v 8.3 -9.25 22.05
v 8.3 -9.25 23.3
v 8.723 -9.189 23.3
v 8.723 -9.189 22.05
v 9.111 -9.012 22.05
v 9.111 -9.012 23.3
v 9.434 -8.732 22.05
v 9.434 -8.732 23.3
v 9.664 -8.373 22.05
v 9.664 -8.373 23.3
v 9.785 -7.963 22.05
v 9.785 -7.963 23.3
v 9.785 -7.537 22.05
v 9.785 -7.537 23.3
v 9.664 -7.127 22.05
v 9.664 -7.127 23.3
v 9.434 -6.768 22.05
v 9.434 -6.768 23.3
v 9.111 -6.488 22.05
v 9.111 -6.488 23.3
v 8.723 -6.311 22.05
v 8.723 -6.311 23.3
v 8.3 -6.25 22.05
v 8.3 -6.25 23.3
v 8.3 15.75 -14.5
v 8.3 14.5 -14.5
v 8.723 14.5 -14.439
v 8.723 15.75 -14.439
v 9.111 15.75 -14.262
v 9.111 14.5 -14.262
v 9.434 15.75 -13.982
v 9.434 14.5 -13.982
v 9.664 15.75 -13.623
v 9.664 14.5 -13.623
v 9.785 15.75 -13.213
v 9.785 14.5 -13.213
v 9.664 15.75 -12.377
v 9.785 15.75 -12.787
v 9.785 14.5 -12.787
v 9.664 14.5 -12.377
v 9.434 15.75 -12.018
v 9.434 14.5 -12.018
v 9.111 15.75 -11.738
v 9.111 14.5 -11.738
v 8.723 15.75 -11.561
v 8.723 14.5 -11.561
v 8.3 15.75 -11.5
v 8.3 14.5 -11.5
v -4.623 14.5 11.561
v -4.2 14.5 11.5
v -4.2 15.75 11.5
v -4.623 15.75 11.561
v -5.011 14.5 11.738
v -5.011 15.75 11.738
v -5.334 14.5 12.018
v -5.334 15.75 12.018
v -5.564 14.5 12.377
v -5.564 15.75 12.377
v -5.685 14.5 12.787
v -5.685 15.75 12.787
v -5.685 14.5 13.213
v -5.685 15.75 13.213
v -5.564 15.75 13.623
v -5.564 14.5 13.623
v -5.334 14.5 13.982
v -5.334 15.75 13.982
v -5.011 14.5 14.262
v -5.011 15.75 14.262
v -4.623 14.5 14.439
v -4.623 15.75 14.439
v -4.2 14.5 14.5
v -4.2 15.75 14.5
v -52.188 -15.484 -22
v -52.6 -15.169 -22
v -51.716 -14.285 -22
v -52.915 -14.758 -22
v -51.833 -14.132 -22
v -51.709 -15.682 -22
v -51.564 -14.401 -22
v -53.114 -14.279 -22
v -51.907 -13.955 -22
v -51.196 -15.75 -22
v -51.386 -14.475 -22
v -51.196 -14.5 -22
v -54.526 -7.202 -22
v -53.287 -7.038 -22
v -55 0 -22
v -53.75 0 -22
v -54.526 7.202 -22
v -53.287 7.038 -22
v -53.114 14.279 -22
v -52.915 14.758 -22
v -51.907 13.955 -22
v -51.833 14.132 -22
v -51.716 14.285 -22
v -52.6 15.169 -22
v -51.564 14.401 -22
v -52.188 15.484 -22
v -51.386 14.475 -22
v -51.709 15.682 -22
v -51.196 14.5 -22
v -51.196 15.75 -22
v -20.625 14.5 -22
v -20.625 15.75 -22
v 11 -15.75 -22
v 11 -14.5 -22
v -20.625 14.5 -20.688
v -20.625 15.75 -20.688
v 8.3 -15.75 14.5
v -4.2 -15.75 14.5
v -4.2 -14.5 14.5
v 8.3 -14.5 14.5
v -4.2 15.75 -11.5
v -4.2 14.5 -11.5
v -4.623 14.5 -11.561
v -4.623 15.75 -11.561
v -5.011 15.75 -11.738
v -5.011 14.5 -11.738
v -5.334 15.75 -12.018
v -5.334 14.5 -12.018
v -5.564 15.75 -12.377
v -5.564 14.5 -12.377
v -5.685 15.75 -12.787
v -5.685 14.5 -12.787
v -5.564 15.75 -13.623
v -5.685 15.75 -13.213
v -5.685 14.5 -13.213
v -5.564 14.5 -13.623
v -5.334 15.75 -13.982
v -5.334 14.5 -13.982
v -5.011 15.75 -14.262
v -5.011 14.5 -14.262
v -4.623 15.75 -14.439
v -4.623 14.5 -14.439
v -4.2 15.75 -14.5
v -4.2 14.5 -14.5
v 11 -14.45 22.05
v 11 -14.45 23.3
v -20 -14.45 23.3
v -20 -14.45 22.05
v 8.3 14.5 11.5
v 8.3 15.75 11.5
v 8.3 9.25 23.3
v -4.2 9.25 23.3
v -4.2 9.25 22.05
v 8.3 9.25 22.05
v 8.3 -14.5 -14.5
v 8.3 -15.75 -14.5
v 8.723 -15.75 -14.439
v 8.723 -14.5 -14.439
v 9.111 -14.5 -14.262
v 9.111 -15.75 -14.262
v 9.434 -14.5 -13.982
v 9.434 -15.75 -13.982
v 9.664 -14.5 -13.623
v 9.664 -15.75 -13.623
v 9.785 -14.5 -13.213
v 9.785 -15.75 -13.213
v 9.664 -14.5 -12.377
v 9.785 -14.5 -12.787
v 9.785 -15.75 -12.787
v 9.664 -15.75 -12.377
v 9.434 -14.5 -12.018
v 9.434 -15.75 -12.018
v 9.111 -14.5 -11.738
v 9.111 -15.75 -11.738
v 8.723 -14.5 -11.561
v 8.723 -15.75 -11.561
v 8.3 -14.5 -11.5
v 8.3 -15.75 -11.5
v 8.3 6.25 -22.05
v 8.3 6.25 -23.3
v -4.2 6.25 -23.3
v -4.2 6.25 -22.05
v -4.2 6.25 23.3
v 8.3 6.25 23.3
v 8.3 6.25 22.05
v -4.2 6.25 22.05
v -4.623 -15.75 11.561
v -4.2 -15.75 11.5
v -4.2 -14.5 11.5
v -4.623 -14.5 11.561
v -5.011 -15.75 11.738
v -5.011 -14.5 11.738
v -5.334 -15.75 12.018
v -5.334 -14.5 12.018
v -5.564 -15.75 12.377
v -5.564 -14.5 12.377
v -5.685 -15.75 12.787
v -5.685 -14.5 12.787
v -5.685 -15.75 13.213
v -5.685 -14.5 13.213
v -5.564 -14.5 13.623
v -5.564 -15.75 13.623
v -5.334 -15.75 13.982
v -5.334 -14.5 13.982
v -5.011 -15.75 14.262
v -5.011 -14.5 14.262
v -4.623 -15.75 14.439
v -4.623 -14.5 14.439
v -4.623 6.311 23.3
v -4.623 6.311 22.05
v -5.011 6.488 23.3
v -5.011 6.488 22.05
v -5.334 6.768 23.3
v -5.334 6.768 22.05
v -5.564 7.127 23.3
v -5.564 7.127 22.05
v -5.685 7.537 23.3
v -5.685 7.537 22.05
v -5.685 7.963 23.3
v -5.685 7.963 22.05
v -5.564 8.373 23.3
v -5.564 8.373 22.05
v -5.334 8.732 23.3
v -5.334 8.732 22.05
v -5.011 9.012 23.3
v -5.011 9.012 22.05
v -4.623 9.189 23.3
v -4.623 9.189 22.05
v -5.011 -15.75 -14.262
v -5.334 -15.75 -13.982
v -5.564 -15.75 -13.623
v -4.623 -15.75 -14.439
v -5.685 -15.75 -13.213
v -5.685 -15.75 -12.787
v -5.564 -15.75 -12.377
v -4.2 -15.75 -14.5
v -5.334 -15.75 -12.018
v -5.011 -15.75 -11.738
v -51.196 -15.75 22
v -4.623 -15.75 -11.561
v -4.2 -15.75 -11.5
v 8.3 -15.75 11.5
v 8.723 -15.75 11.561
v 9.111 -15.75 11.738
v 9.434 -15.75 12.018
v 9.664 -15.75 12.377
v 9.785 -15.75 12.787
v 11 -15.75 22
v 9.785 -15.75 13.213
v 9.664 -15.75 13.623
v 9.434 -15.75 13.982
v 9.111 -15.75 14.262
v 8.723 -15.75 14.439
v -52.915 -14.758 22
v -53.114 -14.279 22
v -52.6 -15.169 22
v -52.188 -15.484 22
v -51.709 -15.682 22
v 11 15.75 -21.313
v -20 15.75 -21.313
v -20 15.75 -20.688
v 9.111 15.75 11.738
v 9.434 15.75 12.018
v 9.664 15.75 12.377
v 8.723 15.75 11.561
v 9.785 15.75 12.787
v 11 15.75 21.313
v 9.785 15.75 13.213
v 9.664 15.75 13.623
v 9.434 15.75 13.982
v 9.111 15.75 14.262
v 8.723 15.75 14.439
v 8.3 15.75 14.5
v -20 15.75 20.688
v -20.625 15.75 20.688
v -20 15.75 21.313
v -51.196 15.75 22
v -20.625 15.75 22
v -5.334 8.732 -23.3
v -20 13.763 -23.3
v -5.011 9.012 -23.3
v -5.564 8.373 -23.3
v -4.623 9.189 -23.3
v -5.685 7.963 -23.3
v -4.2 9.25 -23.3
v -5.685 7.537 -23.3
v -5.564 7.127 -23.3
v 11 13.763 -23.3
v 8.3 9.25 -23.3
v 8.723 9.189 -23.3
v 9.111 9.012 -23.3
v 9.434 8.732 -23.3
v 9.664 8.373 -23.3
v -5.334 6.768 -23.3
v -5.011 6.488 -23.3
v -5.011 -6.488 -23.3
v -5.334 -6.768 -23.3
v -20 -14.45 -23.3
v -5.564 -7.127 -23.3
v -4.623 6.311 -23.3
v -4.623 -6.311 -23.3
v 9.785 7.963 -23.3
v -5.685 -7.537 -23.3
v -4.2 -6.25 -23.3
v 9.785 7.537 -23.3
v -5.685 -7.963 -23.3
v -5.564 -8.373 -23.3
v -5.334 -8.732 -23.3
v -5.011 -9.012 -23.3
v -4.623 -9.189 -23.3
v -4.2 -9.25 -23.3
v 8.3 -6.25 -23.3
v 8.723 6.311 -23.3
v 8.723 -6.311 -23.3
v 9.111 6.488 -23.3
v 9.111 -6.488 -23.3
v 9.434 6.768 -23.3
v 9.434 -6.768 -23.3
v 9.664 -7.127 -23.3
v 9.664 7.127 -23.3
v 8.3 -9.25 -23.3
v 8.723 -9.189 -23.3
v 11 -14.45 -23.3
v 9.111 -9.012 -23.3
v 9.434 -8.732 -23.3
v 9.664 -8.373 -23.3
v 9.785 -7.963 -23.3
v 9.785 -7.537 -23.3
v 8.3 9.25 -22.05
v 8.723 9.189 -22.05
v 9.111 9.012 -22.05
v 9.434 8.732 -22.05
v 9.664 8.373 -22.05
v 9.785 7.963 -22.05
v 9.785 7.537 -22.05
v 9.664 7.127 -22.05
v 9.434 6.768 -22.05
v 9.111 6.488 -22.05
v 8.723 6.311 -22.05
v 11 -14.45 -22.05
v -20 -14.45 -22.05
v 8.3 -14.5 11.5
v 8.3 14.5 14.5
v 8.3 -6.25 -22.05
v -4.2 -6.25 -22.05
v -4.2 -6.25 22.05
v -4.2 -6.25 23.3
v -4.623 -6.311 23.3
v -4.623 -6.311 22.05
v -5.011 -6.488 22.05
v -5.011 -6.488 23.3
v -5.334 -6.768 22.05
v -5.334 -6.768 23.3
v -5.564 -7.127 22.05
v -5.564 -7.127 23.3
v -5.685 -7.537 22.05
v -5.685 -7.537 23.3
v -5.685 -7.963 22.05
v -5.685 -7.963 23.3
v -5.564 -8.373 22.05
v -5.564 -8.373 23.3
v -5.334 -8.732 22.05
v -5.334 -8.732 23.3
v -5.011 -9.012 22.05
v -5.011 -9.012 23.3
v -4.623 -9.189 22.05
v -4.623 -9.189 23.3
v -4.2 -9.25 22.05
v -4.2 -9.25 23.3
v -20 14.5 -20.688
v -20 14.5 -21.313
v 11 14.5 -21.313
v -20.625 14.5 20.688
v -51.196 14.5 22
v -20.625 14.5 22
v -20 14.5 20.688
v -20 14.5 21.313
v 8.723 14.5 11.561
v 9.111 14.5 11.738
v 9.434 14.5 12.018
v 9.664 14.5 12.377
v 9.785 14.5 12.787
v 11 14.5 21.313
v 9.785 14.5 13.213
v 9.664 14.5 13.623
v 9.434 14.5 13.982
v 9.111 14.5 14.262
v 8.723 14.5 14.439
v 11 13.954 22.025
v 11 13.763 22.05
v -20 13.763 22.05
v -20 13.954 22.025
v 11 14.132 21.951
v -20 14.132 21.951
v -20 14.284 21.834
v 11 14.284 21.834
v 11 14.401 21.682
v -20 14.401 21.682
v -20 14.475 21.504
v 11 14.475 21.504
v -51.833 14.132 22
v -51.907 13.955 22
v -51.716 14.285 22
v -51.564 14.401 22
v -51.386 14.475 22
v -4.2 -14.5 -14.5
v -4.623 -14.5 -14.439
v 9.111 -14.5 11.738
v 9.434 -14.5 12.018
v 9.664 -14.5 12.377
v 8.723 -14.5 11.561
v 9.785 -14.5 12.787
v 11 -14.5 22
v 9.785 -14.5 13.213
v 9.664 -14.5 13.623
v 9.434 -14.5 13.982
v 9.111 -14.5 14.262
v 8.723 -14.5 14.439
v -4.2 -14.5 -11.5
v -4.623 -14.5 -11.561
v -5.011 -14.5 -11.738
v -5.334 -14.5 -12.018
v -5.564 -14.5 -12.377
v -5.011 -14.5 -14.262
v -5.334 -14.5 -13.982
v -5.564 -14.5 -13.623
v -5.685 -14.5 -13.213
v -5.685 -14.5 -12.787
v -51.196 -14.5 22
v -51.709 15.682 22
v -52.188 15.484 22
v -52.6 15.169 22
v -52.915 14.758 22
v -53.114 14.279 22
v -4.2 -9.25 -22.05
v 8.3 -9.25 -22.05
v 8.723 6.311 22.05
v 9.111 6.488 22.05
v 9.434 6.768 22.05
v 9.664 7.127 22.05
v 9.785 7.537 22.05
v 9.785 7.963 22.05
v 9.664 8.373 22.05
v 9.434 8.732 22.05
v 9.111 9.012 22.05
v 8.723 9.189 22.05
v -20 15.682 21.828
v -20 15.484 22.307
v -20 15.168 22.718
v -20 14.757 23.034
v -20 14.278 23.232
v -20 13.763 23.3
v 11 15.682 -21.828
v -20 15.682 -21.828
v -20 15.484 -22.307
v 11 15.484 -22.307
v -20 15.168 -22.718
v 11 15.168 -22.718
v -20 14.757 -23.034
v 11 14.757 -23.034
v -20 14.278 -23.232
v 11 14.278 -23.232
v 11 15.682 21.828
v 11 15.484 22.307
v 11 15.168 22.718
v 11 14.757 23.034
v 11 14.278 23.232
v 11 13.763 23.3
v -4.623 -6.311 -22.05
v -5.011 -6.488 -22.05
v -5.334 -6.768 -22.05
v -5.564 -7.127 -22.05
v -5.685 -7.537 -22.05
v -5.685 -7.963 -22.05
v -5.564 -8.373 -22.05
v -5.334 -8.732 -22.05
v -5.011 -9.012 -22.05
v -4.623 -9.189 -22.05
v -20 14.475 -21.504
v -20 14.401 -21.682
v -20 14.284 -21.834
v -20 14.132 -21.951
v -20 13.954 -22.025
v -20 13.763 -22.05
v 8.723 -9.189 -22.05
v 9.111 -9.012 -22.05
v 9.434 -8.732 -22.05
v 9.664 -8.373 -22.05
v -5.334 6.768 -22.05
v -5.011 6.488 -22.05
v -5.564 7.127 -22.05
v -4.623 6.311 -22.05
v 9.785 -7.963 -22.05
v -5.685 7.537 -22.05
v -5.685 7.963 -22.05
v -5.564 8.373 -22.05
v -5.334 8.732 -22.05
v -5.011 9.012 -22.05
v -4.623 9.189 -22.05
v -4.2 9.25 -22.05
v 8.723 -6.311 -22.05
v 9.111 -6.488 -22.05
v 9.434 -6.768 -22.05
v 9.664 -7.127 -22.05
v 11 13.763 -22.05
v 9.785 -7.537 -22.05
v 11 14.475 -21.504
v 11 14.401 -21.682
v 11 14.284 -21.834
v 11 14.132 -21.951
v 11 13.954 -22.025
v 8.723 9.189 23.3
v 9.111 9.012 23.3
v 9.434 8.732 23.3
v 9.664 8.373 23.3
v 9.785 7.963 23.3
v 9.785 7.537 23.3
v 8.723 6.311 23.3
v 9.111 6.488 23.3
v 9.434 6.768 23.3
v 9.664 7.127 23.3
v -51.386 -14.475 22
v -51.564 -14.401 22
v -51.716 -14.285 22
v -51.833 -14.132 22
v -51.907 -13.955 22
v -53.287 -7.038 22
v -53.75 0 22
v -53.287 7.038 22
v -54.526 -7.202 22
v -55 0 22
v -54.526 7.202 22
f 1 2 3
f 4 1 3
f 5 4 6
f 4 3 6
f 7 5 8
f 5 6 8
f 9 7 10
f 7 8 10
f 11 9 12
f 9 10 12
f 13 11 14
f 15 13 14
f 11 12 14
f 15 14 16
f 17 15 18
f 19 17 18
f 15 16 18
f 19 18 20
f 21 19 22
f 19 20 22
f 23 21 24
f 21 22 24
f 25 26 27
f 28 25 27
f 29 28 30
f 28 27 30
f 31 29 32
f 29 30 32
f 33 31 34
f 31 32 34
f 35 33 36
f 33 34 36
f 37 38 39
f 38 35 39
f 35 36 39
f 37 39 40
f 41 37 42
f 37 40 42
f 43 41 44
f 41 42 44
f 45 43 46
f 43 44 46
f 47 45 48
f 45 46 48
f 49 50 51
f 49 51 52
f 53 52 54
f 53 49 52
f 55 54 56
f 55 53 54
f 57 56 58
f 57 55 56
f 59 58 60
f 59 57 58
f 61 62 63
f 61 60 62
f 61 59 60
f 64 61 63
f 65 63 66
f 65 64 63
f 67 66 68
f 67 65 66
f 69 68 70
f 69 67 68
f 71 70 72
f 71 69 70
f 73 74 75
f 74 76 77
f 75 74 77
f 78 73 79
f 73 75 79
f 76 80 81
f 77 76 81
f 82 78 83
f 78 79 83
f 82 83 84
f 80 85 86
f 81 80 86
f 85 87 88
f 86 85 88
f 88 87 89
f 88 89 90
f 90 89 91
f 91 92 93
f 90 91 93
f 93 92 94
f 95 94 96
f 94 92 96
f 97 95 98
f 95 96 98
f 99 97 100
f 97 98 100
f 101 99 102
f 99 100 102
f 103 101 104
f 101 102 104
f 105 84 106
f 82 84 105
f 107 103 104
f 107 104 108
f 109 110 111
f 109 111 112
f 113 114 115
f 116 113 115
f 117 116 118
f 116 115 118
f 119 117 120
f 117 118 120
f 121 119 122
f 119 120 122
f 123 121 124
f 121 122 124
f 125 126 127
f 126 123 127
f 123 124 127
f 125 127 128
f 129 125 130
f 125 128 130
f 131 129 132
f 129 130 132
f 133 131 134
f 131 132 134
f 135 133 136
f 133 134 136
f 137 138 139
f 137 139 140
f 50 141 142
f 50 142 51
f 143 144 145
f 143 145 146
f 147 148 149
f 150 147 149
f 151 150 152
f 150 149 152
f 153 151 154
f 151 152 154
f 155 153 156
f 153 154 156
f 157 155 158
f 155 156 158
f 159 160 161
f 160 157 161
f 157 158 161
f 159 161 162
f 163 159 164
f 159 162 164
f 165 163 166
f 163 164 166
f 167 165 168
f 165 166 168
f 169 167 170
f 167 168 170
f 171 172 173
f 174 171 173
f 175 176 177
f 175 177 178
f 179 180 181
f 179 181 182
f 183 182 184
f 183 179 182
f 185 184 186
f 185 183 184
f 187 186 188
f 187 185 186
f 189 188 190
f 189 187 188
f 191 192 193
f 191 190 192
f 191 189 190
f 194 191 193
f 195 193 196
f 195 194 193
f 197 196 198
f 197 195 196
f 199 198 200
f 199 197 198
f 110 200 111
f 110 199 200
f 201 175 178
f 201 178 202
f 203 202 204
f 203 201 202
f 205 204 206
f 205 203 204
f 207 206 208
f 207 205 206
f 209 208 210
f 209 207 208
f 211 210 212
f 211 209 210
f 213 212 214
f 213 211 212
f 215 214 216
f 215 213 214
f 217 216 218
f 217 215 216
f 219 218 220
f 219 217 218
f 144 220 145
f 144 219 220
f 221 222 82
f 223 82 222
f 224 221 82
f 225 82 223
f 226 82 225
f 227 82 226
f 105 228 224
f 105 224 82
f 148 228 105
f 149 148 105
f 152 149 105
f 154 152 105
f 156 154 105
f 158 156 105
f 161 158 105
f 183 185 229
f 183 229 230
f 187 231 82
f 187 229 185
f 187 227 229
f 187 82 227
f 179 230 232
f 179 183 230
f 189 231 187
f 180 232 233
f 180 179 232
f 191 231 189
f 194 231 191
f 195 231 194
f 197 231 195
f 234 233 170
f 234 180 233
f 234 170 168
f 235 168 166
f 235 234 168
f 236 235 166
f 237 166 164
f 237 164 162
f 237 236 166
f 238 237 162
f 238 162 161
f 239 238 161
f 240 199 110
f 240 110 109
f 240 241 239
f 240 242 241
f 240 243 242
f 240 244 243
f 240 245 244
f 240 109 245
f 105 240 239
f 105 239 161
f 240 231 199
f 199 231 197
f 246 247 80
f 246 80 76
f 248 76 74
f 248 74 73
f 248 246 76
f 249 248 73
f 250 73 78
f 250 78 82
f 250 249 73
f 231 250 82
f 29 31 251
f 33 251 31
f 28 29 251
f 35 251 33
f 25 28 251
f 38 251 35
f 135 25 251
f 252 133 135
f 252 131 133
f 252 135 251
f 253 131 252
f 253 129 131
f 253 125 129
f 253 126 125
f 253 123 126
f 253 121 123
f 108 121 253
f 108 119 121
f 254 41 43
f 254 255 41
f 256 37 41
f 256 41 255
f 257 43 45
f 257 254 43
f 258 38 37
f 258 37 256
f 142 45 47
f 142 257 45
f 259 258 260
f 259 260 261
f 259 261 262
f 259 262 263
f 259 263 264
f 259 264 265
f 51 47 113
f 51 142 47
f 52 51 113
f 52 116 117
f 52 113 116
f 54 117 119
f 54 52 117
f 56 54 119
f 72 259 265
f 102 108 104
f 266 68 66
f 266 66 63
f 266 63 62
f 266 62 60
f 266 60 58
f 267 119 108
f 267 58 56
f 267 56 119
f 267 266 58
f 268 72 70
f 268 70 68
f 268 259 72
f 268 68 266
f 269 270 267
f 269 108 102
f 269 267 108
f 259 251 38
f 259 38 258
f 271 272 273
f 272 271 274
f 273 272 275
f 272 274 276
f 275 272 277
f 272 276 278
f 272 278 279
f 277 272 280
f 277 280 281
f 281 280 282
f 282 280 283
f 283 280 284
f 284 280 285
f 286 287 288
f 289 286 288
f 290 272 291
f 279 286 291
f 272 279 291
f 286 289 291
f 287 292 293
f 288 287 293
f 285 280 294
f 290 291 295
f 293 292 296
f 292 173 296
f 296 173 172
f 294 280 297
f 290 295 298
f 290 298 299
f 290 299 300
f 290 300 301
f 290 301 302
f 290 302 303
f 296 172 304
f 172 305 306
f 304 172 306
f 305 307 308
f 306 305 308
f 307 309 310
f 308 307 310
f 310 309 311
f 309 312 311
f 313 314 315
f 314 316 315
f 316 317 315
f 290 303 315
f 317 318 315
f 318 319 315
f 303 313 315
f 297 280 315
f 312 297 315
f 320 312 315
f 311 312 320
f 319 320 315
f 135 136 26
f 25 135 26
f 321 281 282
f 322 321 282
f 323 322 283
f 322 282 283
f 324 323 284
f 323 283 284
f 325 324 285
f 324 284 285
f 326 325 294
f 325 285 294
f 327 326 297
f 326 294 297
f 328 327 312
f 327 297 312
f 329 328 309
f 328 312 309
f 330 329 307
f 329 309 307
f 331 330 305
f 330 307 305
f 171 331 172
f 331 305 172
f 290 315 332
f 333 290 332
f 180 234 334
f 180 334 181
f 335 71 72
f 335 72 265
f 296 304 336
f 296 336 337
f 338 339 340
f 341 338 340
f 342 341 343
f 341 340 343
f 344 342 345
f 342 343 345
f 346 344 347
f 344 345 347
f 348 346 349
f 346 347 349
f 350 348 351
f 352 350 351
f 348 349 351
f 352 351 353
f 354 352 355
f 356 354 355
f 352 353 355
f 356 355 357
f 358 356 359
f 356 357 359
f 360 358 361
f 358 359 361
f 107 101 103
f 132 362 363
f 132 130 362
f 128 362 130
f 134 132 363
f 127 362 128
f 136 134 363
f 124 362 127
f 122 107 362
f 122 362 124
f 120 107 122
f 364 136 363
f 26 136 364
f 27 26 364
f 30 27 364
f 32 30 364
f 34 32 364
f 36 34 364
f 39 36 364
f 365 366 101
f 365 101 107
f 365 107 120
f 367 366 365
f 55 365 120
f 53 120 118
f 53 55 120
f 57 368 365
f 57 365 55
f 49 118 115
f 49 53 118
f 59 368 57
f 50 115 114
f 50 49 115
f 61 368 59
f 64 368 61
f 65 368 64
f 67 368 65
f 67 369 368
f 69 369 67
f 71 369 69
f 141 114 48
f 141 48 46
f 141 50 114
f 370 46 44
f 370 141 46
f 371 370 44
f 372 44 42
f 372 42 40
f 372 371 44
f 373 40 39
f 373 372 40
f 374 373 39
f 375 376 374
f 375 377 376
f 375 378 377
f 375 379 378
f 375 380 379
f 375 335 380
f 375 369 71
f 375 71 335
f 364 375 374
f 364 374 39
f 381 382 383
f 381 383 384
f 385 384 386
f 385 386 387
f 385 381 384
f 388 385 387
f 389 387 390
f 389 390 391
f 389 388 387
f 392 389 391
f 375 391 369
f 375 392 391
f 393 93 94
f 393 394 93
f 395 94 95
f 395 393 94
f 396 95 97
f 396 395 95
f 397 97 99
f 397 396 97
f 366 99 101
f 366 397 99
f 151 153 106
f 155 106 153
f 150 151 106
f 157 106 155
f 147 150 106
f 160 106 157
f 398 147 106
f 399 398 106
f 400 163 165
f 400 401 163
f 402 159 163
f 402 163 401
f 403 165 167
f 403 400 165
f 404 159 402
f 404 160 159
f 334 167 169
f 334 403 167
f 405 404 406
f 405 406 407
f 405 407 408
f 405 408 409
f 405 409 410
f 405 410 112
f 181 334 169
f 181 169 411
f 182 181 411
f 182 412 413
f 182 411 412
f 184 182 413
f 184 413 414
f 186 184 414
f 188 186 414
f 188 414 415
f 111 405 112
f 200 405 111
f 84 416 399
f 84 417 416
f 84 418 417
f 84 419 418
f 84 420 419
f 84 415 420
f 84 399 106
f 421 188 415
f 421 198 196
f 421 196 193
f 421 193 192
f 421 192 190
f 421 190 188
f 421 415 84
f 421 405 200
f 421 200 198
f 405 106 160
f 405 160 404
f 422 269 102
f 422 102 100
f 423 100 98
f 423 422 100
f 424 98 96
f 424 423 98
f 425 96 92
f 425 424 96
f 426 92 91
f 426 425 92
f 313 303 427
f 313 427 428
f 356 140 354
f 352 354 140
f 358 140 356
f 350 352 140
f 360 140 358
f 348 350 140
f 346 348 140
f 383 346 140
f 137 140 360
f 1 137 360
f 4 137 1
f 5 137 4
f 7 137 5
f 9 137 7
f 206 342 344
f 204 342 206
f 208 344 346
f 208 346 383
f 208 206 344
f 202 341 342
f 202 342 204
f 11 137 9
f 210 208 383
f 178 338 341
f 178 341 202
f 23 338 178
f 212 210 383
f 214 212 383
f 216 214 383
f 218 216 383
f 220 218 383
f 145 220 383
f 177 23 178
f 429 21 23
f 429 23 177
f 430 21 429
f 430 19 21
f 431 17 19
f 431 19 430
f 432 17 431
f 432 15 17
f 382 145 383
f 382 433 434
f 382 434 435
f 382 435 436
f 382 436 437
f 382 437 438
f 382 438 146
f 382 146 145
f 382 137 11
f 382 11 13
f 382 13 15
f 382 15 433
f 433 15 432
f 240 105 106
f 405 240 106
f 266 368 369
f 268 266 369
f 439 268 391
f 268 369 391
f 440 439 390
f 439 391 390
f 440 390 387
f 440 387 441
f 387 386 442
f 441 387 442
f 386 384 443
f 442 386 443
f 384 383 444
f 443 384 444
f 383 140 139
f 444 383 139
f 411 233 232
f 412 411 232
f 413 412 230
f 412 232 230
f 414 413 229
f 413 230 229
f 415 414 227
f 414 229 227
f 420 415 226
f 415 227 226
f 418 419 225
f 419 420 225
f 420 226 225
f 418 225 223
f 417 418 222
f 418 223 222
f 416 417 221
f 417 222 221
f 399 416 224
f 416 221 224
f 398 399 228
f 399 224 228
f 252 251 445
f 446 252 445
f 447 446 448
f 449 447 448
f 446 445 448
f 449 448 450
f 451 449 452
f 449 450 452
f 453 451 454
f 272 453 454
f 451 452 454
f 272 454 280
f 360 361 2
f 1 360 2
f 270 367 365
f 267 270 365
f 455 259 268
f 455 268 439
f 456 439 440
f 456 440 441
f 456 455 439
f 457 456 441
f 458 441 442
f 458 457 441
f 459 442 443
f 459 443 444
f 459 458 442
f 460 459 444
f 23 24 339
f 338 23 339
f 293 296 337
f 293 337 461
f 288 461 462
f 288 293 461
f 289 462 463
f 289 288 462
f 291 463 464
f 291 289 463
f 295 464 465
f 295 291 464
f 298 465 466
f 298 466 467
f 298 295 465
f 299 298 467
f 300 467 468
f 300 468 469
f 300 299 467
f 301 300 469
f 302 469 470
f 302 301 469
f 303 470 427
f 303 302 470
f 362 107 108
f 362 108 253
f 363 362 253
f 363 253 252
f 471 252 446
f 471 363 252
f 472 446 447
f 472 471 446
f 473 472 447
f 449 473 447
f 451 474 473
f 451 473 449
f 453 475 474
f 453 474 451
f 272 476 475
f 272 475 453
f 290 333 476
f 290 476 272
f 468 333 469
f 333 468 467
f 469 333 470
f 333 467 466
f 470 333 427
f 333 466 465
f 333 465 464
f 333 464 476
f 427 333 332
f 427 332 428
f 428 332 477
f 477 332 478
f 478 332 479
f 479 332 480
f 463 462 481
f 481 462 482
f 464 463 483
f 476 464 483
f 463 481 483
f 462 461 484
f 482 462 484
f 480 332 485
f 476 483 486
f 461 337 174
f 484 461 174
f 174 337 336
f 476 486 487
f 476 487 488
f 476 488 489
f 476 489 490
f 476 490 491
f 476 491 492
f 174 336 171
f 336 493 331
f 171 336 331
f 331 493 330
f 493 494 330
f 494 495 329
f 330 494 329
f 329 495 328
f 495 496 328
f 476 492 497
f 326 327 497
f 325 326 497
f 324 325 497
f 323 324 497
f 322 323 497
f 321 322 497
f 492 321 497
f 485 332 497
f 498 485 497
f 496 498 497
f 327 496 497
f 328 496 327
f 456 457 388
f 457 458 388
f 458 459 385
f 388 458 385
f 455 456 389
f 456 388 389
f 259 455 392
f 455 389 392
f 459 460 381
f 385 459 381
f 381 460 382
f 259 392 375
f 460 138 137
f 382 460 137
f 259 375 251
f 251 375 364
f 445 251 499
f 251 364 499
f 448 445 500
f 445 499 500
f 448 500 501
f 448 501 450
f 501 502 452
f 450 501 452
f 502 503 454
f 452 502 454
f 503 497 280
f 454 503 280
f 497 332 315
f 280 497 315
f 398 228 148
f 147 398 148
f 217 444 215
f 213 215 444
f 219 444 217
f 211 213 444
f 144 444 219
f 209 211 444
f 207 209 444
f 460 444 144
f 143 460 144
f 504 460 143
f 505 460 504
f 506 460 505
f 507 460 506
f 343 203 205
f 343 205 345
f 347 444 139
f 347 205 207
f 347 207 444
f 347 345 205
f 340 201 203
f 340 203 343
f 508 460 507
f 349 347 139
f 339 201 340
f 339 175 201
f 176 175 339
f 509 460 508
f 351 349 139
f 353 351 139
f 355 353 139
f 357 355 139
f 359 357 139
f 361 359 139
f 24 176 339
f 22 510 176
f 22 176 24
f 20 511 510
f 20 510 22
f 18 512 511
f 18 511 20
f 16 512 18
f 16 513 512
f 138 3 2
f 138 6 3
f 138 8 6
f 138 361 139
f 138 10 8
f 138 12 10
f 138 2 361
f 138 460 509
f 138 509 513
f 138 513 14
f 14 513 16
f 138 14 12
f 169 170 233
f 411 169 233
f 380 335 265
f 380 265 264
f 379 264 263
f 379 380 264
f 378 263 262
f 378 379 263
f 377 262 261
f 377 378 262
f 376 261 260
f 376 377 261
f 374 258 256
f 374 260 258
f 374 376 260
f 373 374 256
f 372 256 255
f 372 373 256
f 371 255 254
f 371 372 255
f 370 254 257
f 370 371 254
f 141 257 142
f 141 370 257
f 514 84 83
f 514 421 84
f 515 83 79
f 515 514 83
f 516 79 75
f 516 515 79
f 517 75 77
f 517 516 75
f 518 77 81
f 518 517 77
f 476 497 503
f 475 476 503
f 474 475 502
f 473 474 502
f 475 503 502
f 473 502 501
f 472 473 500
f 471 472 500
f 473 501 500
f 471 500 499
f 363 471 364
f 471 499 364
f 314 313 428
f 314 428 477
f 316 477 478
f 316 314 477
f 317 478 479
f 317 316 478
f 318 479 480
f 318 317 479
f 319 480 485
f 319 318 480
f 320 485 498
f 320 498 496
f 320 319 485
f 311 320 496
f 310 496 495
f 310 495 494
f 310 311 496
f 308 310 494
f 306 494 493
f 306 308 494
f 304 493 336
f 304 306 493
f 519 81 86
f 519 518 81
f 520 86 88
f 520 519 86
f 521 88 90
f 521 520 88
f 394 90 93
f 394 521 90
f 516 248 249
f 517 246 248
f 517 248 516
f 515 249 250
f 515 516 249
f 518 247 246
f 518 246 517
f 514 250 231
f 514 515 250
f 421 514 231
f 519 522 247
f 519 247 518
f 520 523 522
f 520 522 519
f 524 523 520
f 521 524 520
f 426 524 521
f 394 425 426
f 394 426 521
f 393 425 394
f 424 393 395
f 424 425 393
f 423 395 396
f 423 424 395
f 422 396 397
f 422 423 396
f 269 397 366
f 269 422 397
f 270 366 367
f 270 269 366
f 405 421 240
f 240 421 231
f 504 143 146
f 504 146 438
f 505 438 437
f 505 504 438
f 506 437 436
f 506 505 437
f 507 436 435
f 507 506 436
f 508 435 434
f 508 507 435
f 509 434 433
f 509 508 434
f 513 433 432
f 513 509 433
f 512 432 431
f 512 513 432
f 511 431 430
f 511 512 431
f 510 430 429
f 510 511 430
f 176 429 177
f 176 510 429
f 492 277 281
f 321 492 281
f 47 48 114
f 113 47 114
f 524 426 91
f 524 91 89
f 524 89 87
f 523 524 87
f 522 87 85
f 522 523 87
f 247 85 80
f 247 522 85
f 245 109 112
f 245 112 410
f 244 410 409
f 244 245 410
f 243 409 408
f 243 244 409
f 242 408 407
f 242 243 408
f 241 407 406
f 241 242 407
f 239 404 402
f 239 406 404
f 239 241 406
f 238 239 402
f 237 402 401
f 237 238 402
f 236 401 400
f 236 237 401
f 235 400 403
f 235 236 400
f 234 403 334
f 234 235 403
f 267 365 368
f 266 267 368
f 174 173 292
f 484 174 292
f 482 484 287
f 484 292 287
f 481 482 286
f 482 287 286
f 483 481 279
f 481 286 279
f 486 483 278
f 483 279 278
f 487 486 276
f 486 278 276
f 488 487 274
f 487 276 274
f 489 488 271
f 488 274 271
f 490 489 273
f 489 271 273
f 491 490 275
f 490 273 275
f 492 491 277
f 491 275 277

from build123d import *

# Parameters (mm, degrees)
BASE_FLANGE1_DEPTH            = 22
CUT_EXTRUDE1_DEPTH            = 62.294881516
CUT_EXTRUDE1_DEPTH_BACK       = 62.294881516
EDGE_FLANGE3_STRIP_W          = 6.5232
EDGE_FLANGE3_STRIP_H          = 1.25
EDGE_FLANGE3_STRIP_CUT_DEPTH  = 31
EDGE_FLANGE3_RELIEF_W         = 7.1482
EDGE_FLANGE3_RELIEF_H         = 0.625
EDGE_FLANGE3_RELIEF_CUT_DEPTH = 1.25
EDGE_FLANGE3_DEPTH            = 31
CUT_EXTRUDE2_DEPTH            = 62.773396377


# Read off the part's stored shape, not the designer's step: Base-Flange1
# Sheet-metal steps are written as plain solids
with BuildPart() as part:
    # Base-Flange1 outline → Base-Flange1 (new body)
    with BuildSketch(Plane.XY):
        with BuildLine():
            Line((-51.19559942, 14.5), (11, 14.5))
            Line((11, 14.5), (11, 15.75))
            Line((11, 15.75), (-51.19559942, 15.75))
            ThreePointArc((-51.19559942, 15.75), (-52.404310309, 15.339977796), (-53.114079989, 14.279163381))
            ThreePointArc((-53.114079989, 14.279163381), (-55, 0), (-53.114079989, -14.279163381))
            ThreePointArc((-53.114079989, -14.279163381), (-52.404310309, -15.339977796), (-51.19559942, -15.75))
            Line((-51.19559942, -15.75), (11, -15.75))
            Line((11, -15.75), (11, -14.5))
            Line((11, -14.5), (-51.19559942, -14.5))
            ThreePointArc((-51.19559942, -14.5), (-51.643770386, -14.347970223), (-51.906941808, -13.954636941))
            ThreePointArc((-51.906941808, -13.954636941), (-53.75, 0), (-51.906941808, 13.954636941))
            ThreePointArc((-51.906941808, 13.954636941), (-51.643770386, 14.347970223), (-51.19559942, 14.5))
        make_face()
    extrude(amount=BASE_FLANGE1_DEPTH)

    # Sketch2 → Cut-Extrude1 (cut, two sides: drawn at the far end of the back side and taken through both)
    with BuildSketch(Plane(origin=(0, 0, 0), x_dir=(1, 0, 0), z_dir=(0, 1, 0)).offset(-CUT_EXTRUDE1_DEPTH_BACK)):
        with BuildLine():
            Line((8.3, -11.5), (-4.2, -11.5))
            ThreePointArc((-4.2, -11.5), (-5.7, -13), (-4.2, -14.5))
            Line((-4.2, -14.5), (8.3, -14.5))
            ThreePointArc((8.3, -14.5), (9.8, -13), (8.3, -11.5))
        make_face()
        with BuildLine():
            Line((8.3, 14.5), (-4.2, 14.5))
            ThreePointArc((-4.2, 14.5), (-5.7, 13), (-4.2, 11.5))
            Line((-4.2, 11.5), (8.3, 11.5))
            ThreePointArc((8.3, 11.5), (9.8, 13), (8.3, 14.5))
        make_face()
    extrude(amount=CUT_EXTRUDE1_DEPTH + CUT_EXTRUDE1_DEPTH_BACK, mode=Mode.SUBTRACT)

    # Edge-Flange3 strip (across the edge) → Edge-Flange3 strip cut (cut)
    with BuildSketch(Plane(origin=(11, 14.5, 22.05), x_dir=(0, 0, -1), z_dir=(-1, 0, 0))):
        with Locations((-2.525, -0.625)):
            Rectangle(EDGE_FLANGE3_STRIP_W, EDGE_FLANGE3_STRIP_H)
    extrude(amount=EDGE_FLANGE3_STRIP_CUT_DEPTH, mode=Mode.SUBTRACT)

    # Edge-Flange3 relief (on the sheet) → Edge-Flange3 relief cut (cut)
    with BuildSketch(Plane(origin=(11, 14.5, 21.3134), x_dir=(0, 0, -1), z_dir=(0, -1, 0))):
        with Locations((-2.9491, -31.3125)):
            Rectangle(EDGE_FLANGE3_RELIEF_W, EDGE_FLANGE3_RELIEF_H)
    extrude(amount=-EDGE_FLANGE3_RELIEF_CUT_DEPTH, mode=Mode.SUBTRACT)

    # Edge-Flange3 section (across the edge) → Edge-Flange3 (add)
    with BuildSketch(Plane(origin=(11, 14.5, 22.05), x_dir=(0, 0, -1), z_dir=(-1, 0, 0))):
        with BuildLine():
            Line((-1.25, 0.7366), (-1.25, 28.95))
            Line((-1.25, 28.95), (0, 28.95))
            Line((0, 28.95), (0, 0.7366))
            ThreePointArc((0, 0.7366), (0.215745145, 0.215745145), (0.7366, 0))
            Line((0.7366, 0), (0.7366, -1.25))
            ThreePointArc((0.7366, -1.25), (-0.668138332, -0.668138332), (-1.25, 0.7366))
        make_face()
    extrude(amount=EDGE_FLANGE3_DEPTH)

    # Sketch29 → Cut-Extrude2 (cut, through all)
    with BuildSketch(Plane.XY.offset(23.3)):
        with BuildLine():
            Line((8.3, -6.25), (-4.2, -6.25))
            ThreePointArc((-4.2, -6.25), (-5.7, -7.75), (-4.2, -9.25))
            Line((-4.2, -9.25), (8.3, -9.25))
            ThreePointArc((8.3, -9.25), (9.8, -7.75), (8.3, -6.25))
        make_face()
        with BuildLine():
            Line((8.3, 6.25), (-4.2, 6.25))
            ThreePointArc((-4.2, 6.25), (-5.7, 7.75), (-4.2, 9.25))
            Line((-4.2, 9.25), (8.3, 9.25))
            ThreePointArc((8.3, 9.25), (9.8, 7.75), (8.3, 6.25))
        make_face()
    extrude(amount=-CUT_EXTRUDE2_DEPTH, mode=Mode.SUBTRACT)

    # Mirror1: part across plane


with BuildPart() as part_1:
    add(part.part)
    add(part.part.mirror(Plane(origin=(-51.906941808, -13.954636941, 0), x_dir=(1, 0, 0), z_dir=(0, 0, -1))))


solid = part_1.part
